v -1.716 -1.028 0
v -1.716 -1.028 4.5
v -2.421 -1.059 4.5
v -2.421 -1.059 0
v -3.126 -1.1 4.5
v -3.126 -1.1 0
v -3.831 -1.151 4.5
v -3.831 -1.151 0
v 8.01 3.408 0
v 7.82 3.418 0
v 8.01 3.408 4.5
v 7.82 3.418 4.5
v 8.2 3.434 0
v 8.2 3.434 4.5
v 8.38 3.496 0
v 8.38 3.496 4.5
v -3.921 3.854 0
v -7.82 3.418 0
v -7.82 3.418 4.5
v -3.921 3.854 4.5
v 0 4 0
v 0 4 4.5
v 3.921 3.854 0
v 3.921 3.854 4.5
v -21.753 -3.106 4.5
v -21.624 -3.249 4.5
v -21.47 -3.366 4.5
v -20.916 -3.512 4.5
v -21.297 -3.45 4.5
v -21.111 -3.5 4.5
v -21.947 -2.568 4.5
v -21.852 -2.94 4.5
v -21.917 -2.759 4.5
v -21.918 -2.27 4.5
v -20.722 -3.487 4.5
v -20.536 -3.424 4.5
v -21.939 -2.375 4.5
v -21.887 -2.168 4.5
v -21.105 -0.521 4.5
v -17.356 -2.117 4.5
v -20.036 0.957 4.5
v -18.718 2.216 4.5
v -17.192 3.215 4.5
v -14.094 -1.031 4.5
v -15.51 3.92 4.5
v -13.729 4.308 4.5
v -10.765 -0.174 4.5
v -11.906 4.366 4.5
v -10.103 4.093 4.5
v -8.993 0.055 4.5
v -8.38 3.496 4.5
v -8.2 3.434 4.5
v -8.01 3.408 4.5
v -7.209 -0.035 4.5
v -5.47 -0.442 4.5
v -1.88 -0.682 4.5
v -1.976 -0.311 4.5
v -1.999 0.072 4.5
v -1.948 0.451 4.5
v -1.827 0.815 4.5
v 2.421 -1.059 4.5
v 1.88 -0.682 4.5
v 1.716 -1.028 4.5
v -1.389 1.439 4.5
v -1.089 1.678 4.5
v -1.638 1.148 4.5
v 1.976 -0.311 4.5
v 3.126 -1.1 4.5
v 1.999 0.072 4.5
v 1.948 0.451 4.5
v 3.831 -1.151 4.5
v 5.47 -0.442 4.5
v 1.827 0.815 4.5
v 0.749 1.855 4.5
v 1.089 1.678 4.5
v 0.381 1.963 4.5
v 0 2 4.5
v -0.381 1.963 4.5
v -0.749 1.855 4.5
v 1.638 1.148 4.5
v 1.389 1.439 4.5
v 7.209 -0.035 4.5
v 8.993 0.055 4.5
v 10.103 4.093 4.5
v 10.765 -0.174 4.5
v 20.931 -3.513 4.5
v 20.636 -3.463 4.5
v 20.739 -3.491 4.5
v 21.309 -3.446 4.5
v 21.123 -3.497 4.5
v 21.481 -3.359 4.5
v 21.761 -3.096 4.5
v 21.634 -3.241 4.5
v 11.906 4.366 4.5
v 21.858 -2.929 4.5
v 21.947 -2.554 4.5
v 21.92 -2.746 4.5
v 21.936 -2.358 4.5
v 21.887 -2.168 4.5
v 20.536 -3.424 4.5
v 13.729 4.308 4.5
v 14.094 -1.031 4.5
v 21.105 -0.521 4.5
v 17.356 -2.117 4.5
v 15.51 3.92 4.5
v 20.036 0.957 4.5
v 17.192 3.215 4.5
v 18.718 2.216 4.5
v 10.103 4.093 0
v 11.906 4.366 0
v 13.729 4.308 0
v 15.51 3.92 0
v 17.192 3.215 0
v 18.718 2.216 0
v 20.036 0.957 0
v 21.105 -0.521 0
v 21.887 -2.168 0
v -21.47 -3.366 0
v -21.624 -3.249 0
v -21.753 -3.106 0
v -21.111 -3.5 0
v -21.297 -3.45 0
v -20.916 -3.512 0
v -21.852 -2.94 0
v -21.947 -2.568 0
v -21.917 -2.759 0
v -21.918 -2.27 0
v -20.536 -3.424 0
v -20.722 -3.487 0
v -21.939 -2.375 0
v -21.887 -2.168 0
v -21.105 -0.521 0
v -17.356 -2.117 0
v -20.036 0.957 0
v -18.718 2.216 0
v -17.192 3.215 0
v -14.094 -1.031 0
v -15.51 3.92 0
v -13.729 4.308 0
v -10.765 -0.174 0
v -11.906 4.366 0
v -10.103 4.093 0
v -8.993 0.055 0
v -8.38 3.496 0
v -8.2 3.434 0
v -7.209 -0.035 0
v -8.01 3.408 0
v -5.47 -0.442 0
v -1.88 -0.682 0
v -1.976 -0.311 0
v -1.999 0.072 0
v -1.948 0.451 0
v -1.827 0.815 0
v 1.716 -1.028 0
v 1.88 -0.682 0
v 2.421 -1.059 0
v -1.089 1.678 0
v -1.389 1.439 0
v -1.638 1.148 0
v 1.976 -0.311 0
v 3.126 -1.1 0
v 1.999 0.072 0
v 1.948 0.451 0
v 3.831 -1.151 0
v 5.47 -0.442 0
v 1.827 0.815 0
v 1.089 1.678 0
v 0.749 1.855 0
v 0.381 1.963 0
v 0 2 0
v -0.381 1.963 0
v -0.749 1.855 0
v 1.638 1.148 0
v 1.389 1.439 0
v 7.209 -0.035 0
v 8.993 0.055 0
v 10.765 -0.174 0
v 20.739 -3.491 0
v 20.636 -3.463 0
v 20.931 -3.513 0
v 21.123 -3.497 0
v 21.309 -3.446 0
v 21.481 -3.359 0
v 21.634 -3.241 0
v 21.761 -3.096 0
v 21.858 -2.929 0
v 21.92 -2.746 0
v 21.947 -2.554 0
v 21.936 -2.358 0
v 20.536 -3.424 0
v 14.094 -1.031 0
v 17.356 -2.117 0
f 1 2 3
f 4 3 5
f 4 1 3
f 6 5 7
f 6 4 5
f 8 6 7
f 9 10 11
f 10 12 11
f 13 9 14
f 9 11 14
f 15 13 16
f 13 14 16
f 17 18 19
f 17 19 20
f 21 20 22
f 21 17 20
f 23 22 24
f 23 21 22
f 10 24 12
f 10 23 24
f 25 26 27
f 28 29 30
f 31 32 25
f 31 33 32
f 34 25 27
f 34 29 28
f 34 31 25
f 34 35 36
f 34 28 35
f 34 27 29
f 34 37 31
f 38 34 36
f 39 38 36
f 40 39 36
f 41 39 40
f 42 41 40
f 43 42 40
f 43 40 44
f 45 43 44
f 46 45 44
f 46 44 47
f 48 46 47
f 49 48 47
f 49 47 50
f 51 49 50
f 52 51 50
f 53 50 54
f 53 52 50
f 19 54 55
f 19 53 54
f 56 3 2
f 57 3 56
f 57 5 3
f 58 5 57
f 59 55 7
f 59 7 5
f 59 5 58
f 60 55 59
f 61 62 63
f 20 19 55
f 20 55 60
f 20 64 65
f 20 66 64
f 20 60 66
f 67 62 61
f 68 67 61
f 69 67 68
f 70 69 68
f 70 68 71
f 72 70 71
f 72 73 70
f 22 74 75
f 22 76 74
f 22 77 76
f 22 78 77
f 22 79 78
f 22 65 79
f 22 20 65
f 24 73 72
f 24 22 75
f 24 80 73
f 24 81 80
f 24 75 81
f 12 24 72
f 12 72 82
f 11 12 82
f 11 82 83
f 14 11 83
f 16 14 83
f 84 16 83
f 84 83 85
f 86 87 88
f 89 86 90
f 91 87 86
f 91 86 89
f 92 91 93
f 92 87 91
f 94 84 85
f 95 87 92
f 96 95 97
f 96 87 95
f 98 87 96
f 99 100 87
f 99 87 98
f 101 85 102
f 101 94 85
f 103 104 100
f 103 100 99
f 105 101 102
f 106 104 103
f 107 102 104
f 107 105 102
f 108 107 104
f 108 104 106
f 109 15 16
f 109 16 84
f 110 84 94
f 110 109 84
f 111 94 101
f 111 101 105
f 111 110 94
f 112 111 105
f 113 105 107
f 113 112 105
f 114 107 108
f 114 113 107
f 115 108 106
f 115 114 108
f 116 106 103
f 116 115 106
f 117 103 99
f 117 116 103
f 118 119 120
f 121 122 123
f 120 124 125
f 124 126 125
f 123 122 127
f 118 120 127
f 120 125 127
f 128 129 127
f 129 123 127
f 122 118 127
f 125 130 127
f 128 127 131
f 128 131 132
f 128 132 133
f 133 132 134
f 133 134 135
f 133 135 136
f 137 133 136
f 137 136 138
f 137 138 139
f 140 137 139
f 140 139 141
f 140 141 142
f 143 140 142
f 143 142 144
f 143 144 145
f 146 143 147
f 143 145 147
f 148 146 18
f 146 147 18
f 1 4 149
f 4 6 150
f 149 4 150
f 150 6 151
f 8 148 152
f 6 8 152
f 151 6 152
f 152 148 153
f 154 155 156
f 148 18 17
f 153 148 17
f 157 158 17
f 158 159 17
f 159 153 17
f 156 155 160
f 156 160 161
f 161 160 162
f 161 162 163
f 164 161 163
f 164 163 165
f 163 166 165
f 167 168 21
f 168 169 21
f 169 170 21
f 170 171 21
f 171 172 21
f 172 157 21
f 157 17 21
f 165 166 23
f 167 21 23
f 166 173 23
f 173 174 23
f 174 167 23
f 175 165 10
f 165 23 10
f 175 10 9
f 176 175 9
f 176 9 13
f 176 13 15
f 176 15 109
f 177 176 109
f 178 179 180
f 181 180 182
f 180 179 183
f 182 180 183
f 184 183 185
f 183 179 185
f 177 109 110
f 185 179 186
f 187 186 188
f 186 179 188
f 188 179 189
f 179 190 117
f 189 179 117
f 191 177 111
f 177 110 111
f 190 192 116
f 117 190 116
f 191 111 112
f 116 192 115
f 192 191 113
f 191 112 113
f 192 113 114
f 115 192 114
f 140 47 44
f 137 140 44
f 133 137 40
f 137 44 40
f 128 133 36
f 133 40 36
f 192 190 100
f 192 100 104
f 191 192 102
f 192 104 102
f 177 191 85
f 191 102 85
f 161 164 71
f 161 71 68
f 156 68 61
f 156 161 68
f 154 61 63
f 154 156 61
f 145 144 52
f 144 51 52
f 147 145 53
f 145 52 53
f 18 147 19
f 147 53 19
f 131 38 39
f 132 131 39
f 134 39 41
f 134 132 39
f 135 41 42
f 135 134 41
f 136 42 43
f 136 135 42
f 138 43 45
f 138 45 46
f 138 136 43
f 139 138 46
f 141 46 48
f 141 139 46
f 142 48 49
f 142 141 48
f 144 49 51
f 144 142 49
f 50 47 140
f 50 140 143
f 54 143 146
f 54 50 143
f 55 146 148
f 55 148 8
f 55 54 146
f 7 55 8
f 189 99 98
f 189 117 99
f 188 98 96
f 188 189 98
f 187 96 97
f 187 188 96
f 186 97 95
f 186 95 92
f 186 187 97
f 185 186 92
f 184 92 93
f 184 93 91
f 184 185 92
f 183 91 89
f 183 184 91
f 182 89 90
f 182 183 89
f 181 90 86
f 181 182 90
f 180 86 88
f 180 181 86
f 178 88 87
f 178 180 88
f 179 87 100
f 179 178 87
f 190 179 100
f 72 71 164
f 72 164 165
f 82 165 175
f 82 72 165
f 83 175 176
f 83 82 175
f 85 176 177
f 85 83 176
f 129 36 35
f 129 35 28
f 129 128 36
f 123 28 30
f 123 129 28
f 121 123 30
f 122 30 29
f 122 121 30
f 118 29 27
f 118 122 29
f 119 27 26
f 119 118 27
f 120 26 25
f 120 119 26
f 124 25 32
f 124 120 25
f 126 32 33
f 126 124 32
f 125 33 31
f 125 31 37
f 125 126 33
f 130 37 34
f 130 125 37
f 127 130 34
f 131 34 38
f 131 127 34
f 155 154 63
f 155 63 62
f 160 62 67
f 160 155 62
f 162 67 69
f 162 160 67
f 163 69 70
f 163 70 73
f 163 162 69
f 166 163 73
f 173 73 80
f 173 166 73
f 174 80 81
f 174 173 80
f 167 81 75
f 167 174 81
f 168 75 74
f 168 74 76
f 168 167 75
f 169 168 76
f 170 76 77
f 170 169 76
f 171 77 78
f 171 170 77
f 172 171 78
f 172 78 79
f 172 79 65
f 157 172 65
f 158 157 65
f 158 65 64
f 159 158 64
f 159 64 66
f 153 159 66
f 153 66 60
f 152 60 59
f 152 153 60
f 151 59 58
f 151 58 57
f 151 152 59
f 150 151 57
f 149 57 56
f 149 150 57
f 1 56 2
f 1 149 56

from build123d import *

# Parameters (mm, degrees)
BOSS_EXTRUDE1_DEPTH = 4.5
CUT_EXTRUDE1_DEPTH  = 24.873773295
FILLET1_R           = 10
FILLET2_R           = 1


with BuildPart() as part:
    # Sketch1 → Boss-Extrude1 (new body)
    with BuildSketch(Plane.XY):
        with BuildLine():
            ThreePointArc((1.715540677, -1.028066236), (0, 2), (-1.715540677, -1.028066236))
            ThreePointArc((-1.715540677, -1.028066236), (-12.4000088, -2.631992998), (-22.452233946, -6.592196245))
            ThreePointArc((-22.452233946, -6.592196245), (-18.208029962, 2.594911639), (-8.117877526, 3.372756458))
            ThreePointArc((-8.117877526, 3.372756458), (0, 4), (8.117877526, 3.372756458))
            ThreePointArc((8.117877526, 3.372756458), (18.208029962, 2.594911639), (22.452233946, -6.592196245))
            ThreePointArc((22.452233946, -6.592196245), (12.4000088, -2.631992998), (1.715540677, -1.028066236))
        make_face()
    extrude(amount=BOSS_EXTRUDE1_DEPTH)

    # Sketch2 → Cut-Extrude1 (cut, through all)
    with BuildSketch(Plane.XY.offset(4.5)):
        with BuildLine():
            ThreePointArc((-3.908816698, 0.849206701), (0, -98.692698318), (3.908816698, 0.849206701))
            ThreePointArc((3.908816698, 0.849206701), (0, -4), (-3.908816698, 0.849206701))
        make_face()
    extrude(amount=-CUT_EXTRUDE1_DEPTH, mode=Mode.SUBTRACT)

    # Fillet1
    # the kernel refuses this fillet: 10 mm, written as the material it adds along each edge
    with BuildSketch(Plane(origin=(3.908816698, 0.849206701, 4.5), x_dir=(0.9890559129703541, -0.14754118414320608, 0), z_dir=(0, 0, -1))) as fillet1_piece_1:
        with BuildLine():
            CenterArc((6.236508998, 9.975798703), FILLET1_R, 232.997328349, 40.989656439)
            Line((0.217986376, 1.989724232), (0.097615924, 1.830002743))
            ThreePointArc((0.097615924, 1.830002743), (0.036653136, 1.002787408), (-0.187037265, 0.070831218))
            Line((-0.187037265, 0.070831218), (-0.013905973, -0.199515974))
            ThreePointArc((-0.013905973, -0.199515974), (3.465903834, -0.320637896), (6.945713641, -0.199515974))
            Line((6.945713641, -0.199515974), (6.931807668, 0))
        make_face()
    extrude(amount=4.5)
    with BuildSketch(Plane(origin=(-3.908816698, 0.849206701, 4.5), x_dir=(-0.9890559129703533, -0.14754118414321077, 0), z_dir=(0, 0, -1))) as fillet1_piece_2:
        with BuildLine():
            CenterArc((6.236508998, -9.975798703), FILLET1_R, 86.013015212, 40.989656439)
            Line((0.217986376, -1.989724232), (0.097615924, -1.830002743))
            ThreePointArc((0.097615924, -1.830002743), (0.036653136, -1.002787408), (-0.187037265, -0.070831218))
            Line((-0.187037265, -0.070831218), (-0.013905973, 0.199515974))
            ThreePointArc((-0.013905973, 0.199515974), (3.465903834, 0.320637896), (6.945713641, 0.199515974))
            Line((6.945713641, 0.199515974), (6.931807668, 0))
        make_face()
    extrude(amount=4.5)

    # Fillet2
    fillet2_edges = [part.edges().sort_by_distance(p)[0] for p in [
        (-8.117877526, 3.372756458, 2.25),
        (8.117877526, 3.372756458, 2.25),
        (22.415896296, -4.321740675, 2.25),
        (-22.415896296, -4.321740675, 2.25),
    ]]
    fillet(fillet2_edges, radius=FILLET2_R)


solid = part.part
